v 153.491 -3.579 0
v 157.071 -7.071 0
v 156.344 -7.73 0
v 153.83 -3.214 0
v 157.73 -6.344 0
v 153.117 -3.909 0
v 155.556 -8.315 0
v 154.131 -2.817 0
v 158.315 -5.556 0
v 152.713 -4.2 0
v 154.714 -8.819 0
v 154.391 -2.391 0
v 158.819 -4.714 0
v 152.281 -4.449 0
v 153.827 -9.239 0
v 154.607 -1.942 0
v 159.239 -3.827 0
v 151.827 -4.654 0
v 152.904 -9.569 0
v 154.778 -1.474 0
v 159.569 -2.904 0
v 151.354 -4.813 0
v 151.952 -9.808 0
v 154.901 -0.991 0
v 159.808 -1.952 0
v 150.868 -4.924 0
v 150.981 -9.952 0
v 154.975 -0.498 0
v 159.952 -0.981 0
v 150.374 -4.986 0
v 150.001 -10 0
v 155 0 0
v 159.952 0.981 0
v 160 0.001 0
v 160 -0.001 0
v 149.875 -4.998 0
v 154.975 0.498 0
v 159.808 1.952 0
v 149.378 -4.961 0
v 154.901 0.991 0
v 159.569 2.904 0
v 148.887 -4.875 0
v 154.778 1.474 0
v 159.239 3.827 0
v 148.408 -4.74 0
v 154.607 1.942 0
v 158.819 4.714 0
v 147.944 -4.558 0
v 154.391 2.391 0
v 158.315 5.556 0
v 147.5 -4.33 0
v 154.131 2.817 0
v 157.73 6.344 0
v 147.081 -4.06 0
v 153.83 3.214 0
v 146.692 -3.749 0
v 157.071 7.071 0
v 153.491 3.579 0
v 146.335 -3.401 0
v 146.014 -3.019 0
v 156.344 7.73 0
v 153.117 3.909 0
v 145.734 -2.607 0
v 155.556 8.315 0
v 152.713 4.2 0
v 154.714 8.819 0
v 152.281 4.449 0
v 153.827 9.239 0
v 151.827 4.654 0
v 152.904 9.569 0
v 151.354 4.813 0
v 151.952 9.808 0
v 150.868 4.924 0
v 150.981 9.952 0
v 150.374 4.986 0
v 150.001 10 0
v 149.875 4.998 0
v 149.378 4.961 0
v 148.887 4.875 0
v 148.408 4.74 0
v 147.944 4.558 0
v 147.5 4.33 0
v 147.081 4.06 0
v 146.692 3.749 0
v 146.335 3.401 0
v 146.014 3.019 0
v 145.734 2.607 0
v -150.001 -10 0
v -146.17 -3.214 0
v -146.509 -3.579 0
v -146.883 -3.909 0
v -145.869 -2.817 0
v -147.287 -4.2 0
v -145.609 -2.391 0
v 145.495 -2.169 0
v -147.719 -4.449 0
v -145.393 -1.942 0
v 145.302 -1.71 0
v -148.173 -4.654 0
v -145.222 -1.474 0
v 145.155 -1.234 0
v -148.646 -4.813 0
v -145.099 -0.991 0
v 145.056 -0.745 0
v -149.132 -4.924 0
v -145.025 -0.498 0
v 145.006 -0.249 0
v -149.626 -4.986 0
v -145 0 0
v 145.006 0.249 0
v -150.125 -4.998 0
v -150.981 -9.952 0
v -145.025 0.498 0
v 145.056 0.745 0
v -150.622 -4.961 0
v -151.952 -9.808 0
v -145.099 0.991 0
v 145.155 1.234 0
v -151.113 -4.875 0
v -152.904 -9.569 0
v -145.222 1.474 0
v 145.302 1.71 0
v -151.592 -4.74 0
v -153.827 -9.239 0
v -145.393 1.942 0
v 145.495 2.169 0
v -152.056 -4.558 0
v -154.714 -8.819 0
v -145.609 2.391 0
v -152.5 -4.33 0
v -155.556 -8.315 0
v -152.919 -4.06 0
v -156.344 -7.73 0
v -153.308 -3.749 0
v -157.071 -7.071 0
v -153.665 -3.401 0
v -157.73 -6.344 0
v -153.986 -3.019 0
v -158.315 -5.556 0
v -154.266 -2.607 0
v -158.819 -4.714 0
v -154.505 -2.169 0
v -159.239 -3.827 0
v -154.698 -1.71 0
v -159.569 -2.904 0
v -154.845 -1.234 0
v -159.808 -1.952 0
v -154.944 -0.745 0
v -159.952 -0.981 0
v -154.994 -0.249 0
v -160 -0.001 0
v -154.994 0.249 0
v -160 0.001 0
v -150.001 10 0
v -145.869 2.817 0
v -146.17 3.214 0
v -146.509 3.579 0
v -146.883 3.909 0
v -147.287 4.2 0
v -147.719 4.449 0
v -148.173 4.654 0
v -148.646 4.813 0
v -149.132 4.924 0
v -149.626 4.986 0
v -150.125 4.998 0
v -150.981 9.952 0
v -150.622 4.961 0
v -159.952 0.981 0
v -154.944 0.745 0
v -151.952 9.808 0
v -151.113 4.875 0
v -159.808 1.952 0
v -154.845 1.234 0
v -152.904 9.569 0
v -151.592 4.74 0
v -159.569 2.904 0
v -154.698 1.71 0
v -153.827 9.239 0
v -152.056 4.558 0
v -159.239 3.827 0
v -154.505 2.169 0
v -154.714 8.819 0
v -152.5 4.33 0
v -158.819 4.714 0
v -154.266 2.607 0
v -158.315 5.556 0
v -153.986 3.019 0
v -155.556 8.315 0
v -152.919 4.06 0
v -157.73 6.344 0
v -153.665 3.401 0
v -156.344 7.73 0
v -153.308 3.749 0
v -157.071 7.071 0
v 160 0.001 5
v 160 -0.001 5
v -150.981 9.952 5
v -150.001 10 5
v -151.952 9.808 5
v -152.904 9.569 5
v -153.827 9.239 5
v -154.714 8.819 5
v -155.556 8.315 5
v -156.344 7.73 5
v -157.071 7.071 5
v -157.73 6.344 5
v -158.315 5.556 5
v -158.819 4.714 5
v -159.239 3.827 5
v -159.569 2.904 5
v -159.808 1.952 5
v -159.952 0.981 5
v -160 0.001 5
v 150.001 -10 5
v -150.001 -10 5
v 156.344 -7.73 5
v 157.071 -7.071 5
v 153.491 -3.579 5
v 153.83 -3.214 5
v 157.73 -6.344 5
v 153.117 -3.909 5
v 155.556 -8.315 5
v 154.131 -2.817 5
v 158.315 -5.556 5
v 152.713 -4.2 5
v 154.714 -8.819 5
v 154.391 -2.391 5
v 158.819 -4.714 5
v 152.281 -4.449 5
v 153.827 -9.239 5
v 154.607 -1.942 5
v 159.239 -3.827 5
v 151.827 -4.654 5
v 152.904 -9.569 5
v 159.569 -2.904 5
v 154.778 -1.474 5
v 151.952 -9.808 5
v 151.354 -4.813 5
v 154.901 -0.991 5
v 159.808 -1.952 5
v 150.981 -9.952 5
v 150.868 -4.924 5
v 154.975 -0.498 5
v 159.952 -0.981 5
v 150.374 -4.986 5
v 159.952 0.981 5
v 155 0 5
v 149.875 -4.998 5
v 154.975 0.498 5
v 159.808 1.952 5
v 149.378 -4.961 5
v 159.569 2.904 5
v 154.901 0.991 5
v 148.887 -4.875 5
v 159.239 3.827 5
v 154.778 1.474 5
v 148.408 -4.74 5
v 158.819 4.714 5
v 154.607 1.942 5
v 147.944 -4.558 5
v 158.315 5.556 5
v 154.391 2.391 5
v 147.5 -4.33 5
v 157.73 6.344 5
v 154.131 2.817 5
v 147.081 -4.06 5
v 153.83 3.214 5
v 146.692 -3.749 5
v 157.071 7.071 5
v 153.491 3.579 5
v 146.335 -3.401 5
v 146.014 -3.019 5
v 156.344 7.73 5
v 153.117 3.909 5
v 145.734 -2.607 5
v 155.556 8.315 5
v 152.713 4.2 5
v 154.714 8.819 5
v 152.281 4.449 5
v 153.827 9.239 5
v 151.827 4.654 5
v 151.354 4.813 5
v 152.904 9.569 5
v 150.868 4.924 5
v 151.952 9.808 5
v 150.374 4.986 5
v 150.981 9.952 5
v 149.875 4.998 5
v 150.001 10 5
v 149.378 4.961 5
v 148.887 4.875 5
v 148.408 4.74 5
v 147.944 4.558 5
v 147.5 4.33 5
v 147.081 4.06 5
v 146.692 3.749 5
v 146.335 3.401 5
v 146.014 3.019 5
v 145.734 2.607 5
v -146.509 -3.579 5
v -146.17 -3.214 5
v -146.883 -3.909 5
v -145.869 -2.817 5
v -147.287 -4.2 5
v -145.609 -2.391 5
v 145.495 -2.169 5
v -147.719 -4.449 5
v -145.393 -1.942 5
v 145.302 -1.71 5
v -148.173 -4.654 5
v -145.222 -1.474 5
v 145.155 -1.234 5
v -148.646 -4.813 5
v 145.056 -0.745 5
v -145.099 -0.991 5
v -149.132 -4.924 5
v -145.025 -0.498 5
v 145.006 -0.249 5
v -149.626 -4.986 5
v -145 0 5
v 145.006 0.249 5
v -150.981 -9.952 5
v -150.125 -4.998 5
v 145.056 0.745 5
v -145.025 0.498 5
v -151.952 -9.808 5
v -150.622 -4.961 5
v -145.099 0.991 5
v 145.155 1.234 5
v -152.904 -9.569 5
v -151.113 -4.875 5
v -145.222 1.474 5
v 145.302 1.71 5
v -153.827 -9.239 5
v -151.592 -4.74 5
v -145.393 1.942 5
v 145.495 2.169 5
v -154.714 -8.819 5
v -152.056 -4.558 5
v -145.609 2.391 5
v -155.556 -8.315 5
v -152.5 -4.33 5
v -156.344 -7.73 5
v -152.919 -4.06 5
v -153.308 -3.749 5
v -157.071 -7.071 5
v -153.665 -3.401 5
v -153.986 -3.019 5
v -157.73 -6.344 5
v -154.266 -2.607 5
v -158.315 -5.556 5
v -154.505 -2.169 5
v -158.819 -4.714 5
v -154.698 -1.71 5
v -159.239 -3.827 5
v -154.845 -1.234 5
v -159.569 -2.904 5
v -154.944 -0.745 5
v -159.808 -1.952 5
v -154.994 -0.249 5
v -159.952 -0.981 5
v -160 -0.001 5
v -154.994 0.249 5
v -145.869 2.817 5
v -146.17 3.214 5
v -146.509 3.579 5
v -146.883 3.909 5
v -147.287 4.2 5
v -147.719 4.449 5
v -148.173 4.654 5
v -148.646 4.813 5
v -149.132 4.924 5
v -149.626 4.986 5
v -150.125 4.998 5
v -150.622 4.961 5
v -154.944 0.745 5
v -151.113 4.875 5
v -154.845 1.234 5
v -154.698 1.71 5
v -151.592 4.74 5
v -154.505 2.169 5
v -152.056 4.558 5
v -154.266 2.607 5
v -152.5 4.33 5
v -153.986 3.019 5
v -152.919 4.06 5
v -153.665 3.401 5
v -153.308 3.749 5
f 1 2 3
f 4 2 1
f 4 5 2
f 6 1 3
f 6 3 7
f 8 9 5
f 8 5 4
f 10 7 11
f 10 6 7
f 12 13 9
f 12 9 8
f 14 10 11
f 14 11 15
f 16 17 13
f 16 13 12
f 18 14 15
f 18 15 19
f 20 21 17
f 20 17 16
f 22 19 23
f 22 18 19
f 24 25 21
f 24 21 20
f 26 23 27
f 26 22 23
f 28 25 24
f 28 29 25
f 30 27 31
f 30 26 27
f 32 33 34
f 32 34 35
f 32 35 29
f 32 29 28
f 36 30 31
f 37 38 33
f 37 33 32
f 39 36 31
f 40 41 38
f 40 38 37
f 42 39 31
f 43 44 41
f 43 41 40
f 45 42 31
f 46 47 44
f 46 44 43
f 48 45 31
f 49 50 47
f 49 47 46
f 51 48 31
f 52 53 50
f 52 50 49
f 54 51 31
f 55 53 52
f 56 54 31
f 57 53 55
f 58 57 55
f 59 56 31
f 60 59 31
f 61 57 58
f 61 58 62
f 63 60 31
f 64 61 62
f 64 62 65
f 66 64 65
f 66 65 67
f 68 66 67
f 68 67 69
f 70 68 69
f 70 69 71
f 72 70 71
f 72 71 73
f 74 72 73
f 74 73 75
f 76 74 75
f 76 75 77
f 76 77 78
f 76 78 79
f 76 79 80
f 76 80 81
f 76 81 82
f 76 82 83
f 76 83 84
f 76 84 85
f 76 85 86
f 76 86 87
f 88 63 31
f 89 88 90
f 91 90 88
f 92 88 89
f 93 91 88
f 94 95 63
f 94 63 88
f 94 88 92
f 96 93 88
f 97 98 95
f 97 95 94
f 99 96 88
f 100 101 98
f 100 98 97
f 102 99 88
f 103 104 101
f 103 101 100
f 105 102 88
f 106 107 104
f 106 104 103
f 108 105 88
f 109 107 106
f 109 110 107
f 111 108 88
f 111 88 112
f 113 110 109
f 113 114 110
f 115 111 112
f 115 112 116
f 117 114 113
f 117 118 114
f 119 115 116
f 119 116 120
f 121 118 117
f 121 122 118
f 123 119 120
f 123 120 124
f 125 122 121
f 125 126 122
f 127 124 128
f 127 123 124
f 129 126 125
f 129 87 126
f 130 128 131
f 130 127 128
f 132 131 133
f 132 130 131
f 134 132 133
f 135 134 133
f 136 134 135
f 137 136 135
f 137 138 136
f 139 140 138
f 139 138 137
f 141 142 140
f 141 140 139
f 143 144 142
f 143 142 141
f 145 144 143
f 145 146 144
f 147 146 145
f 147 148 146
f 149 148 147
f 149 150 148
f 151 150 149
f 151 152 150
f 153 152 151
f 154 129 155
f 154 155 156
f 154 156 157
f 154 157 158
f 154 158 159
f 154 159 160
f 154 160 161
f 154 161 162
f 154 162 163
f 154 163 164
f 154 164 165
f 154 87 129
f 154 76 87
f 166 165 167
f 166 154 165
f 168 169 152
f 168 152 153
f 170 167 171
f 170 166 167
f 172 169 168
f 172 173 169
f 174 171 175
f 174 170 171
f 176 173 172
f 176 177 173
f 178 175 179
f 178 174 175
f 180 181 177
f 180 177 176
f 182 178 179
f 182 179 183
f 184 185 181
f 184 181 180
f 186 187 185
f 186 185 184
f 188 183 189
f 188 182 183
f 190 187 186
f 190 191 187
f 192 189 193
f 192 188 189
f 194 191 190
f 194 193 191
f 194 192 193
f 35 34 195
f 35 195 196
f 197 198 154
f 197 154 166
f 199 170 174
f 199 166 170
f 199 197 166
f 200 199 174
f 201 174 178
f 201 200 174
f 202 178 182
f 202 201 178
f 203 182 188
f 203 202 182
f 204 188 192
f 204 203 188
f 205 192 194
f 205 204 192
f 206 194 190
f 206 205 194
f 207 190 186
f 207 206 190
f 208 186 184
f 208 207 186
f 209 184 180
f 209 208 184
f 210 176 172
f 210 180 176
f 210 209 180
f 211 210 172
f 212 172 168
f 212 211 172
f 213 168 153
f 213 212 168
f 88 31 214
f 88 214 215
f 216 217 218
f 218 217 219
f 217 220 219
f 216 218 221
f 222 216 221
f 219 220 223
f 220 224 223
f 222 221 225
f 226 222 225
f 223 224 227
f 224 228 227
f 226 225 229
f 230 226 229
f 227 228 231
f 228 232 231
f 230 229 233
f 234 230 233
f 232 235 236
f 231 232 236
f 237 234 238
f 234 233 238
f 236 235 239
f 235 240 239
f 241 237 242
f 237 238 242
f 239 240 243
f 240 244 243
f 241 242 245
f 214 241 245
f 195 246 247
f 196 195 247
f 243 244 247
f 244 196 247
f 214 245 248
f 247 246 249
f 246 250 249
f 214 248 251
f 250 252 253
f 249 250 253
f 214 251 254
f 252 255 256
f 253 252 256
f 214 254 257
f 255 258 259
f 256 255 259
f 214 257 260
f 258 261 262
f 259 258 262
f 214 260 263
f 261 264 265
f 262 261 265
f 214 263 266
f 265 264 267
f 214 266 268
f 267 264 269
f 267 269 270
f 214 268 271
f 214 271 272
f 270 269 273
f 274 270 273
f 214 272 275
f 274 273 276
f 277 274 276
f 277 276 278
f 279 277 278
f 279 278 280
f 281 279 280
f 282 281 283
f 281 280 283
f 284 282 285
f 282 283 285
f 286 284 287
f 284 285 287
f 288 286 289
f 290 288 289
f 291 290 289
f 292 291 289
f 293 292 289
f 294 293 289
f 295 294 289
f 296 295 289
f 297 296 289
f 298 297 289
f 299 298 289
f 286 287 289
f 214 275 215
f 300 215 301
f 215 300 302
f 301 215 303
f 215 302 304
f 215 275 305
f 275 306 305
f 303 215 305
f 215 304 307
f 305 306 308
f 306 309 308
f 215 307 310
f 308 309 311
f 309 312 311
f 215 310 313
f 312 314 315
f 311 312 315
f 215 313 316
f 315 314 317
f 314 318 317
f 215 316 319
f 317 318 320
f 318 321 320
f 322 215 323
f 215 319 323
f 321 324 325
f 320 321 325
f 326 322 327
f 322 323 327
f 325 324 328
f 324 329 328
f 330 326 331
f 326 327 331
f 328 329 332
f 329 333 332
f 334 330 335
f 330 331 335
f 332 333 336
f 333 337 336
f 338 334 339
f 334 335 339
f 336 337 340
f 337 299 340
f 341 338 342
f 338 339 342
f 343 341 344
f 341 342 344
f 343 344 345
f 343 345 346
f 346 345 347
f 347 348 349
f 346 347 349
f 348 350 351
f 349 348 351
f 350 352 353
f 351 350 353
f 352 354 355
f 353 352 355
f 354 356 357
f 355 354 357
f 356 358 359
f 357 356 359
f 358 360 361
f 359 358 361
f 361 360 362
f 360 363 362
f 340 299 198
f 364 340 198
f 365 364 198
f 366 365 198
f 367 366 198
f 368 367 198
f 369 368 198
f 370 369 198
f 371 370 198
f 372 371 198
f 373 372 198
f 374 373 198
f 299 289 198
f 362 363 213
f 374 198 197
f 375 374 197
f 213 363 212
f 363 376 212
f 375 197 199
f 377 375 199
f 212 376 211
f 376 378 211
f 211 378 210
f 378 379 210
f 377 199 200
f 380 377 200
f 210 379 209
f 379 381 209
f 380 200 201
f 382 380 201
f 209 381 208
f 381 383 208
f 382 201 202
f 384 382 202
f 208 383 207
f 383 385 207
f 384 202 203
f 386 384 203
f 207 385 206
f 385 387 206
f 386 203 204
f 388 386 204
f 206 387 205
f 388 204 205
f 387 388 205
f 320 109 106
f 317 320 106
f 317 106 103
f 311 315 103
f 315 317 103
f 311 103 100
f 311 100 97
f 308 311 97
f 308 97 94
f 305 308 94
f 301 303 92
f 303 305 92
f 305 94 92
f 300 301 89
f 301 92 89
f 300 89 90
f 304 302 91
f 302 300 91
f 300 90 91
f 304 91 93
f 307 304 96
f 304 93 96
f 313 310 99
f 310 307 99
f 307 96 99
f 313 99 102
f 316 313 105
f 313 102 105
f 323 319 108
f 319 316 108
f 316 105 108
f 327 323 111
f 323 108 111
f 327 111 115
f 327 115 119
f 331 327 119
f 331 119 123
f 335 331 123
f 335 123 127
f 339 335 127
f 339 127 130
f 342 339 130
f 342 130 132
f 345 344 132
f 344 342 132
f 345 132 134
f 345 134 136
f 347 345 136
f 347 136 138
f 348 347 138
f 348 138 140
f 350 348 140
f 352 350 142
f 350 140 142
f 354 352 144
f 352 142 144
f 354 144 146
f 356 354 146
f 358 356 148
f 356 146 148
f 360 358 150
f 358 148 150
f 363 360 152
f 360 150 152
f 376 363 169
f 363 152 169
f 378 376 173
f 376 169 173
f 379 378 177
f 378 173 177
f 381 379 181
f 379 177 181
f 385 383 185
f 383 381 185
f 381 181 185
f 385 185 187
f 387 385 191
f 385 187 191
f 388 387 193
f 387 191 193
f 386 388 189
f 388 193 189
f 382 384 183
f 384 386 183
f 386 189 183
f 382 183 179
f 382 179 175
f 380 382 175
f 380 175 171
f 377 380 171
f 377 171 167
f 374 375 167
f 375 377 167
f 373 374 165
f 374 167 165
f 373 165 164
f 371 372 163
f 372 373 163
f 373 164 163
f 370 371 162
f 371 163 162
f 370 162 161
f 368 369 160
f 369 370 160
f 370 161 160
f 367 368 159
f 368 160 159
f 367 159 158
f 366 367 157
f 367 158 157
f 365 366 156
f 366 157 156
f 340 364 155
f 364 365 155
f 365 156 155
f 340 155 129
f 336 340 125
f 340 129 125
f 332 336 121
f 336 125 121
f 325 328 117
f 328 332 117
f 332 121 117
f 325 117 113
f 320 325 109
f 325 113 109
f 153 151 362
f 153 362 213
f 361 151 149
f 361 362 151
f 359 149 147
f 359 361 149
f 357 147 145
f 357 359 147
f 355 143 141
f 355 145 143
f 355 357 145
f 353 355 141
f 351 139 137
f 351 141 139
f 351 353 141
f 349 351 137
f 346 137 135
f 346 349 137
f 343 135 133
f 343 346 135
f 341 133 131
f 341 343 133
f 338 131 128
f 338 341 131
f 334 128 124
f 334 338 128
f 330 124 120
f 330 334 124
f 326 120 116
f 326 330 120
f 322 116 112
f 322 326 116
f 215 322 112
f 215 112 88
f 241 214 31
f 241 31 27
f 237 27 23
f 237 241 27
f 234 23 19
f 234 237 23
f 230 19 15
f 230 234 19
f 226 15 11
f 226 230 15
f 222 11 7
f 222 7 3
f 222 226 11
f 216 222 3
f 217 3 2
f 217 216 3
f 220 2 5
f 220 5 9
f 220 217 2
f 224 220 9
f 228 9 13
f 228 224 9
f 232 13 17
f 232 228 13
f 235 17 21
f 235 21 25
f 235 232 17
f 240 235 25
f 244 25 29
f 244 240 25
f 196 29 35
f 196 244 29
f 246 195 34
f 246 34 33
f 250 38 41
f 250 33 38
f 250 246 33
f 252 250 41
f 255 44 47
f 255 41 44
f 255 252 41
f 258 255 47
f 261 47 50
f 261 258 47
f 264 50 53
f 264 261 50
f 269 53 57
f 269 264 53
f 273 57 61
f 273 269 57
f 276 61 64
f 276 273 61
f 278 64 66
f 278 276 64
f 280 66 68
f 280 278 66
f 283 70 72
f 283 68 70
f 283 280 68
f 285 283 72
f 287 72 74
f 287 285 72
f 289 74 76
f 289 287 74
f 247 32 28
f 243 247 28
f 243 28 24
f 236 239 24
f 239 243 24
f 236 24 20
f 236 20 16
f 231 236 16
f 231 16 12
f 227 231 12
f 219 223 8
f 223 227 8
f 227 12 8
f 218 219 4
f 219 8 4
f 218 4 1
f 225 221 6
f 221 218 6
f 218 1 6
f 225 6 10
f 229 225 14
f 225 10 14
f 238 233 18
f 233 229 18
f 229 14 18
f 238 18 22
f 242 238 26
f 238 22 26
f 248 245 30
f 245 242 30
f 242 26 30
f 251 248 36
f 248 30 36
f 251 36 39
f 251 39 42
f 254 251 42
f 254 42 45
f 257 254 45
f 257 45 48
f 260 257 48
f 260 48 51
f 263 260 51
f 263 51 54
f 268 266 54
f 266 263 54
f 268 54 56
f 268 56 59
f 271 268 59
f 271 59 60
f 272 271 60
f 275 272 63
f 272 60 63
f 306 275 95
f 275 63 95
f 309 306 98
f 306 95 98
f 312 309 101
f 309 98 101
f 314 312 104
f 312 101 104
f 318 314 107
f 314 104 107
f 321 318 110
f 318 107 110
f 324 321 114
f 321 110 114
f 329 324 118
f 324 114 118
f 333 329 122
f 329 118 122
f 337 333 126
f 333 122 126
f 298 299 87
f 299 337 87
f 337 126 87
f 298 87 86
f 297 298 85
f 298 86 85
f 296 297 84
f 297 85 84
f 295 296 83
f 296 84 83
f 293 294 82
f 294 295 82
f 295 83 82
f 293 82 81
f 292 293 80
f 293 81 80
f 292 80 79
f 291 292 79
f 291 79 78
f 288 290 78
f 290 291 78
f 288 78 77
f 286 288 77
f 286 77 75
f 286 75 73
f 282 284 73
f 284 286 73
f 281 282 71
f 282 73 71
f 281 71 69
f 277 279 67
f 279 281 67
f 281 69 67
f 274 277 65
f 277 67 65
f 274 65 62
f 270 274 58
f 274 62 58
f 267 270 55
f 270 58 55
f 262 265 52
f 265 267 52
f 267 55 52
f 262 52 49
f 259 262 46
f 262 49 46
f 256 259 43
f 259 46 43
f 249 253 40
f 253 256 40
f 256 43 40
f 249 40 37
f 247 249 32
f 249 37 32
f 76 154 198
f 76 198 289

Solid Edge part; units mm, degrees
sketch "Sketch1" plane through (0, 0, 0) normal (0, 0, 1) x (1, 0, 0)
  line L0 (160, -10) -> (-160, -10)
  line L1 (-160, -10) -> (-160, 10)
  line L2 (-160, 10) -> (160, 10)
  line L3 (160, 10) -> (160, -10)
  circle A0 centre (-150, 0) radius 5
  circle A1 centre (150, 0) radius 5
  dimension "D1" = 10
  dimension "D2" = 10
  dimension "D3" = 300
  dimension "D4" = 320
  dimension "D5" = 20
  dimension "D6" = 150
extrude "Protrusion1" add sketch "Sketch1" along normal blind 5
fillet "Round_1" radius 10 4 edges at (160, -10, 2.5) (160, 10, 2.5) (-160, 10, 2.5) (-160, -10, 2.5)
